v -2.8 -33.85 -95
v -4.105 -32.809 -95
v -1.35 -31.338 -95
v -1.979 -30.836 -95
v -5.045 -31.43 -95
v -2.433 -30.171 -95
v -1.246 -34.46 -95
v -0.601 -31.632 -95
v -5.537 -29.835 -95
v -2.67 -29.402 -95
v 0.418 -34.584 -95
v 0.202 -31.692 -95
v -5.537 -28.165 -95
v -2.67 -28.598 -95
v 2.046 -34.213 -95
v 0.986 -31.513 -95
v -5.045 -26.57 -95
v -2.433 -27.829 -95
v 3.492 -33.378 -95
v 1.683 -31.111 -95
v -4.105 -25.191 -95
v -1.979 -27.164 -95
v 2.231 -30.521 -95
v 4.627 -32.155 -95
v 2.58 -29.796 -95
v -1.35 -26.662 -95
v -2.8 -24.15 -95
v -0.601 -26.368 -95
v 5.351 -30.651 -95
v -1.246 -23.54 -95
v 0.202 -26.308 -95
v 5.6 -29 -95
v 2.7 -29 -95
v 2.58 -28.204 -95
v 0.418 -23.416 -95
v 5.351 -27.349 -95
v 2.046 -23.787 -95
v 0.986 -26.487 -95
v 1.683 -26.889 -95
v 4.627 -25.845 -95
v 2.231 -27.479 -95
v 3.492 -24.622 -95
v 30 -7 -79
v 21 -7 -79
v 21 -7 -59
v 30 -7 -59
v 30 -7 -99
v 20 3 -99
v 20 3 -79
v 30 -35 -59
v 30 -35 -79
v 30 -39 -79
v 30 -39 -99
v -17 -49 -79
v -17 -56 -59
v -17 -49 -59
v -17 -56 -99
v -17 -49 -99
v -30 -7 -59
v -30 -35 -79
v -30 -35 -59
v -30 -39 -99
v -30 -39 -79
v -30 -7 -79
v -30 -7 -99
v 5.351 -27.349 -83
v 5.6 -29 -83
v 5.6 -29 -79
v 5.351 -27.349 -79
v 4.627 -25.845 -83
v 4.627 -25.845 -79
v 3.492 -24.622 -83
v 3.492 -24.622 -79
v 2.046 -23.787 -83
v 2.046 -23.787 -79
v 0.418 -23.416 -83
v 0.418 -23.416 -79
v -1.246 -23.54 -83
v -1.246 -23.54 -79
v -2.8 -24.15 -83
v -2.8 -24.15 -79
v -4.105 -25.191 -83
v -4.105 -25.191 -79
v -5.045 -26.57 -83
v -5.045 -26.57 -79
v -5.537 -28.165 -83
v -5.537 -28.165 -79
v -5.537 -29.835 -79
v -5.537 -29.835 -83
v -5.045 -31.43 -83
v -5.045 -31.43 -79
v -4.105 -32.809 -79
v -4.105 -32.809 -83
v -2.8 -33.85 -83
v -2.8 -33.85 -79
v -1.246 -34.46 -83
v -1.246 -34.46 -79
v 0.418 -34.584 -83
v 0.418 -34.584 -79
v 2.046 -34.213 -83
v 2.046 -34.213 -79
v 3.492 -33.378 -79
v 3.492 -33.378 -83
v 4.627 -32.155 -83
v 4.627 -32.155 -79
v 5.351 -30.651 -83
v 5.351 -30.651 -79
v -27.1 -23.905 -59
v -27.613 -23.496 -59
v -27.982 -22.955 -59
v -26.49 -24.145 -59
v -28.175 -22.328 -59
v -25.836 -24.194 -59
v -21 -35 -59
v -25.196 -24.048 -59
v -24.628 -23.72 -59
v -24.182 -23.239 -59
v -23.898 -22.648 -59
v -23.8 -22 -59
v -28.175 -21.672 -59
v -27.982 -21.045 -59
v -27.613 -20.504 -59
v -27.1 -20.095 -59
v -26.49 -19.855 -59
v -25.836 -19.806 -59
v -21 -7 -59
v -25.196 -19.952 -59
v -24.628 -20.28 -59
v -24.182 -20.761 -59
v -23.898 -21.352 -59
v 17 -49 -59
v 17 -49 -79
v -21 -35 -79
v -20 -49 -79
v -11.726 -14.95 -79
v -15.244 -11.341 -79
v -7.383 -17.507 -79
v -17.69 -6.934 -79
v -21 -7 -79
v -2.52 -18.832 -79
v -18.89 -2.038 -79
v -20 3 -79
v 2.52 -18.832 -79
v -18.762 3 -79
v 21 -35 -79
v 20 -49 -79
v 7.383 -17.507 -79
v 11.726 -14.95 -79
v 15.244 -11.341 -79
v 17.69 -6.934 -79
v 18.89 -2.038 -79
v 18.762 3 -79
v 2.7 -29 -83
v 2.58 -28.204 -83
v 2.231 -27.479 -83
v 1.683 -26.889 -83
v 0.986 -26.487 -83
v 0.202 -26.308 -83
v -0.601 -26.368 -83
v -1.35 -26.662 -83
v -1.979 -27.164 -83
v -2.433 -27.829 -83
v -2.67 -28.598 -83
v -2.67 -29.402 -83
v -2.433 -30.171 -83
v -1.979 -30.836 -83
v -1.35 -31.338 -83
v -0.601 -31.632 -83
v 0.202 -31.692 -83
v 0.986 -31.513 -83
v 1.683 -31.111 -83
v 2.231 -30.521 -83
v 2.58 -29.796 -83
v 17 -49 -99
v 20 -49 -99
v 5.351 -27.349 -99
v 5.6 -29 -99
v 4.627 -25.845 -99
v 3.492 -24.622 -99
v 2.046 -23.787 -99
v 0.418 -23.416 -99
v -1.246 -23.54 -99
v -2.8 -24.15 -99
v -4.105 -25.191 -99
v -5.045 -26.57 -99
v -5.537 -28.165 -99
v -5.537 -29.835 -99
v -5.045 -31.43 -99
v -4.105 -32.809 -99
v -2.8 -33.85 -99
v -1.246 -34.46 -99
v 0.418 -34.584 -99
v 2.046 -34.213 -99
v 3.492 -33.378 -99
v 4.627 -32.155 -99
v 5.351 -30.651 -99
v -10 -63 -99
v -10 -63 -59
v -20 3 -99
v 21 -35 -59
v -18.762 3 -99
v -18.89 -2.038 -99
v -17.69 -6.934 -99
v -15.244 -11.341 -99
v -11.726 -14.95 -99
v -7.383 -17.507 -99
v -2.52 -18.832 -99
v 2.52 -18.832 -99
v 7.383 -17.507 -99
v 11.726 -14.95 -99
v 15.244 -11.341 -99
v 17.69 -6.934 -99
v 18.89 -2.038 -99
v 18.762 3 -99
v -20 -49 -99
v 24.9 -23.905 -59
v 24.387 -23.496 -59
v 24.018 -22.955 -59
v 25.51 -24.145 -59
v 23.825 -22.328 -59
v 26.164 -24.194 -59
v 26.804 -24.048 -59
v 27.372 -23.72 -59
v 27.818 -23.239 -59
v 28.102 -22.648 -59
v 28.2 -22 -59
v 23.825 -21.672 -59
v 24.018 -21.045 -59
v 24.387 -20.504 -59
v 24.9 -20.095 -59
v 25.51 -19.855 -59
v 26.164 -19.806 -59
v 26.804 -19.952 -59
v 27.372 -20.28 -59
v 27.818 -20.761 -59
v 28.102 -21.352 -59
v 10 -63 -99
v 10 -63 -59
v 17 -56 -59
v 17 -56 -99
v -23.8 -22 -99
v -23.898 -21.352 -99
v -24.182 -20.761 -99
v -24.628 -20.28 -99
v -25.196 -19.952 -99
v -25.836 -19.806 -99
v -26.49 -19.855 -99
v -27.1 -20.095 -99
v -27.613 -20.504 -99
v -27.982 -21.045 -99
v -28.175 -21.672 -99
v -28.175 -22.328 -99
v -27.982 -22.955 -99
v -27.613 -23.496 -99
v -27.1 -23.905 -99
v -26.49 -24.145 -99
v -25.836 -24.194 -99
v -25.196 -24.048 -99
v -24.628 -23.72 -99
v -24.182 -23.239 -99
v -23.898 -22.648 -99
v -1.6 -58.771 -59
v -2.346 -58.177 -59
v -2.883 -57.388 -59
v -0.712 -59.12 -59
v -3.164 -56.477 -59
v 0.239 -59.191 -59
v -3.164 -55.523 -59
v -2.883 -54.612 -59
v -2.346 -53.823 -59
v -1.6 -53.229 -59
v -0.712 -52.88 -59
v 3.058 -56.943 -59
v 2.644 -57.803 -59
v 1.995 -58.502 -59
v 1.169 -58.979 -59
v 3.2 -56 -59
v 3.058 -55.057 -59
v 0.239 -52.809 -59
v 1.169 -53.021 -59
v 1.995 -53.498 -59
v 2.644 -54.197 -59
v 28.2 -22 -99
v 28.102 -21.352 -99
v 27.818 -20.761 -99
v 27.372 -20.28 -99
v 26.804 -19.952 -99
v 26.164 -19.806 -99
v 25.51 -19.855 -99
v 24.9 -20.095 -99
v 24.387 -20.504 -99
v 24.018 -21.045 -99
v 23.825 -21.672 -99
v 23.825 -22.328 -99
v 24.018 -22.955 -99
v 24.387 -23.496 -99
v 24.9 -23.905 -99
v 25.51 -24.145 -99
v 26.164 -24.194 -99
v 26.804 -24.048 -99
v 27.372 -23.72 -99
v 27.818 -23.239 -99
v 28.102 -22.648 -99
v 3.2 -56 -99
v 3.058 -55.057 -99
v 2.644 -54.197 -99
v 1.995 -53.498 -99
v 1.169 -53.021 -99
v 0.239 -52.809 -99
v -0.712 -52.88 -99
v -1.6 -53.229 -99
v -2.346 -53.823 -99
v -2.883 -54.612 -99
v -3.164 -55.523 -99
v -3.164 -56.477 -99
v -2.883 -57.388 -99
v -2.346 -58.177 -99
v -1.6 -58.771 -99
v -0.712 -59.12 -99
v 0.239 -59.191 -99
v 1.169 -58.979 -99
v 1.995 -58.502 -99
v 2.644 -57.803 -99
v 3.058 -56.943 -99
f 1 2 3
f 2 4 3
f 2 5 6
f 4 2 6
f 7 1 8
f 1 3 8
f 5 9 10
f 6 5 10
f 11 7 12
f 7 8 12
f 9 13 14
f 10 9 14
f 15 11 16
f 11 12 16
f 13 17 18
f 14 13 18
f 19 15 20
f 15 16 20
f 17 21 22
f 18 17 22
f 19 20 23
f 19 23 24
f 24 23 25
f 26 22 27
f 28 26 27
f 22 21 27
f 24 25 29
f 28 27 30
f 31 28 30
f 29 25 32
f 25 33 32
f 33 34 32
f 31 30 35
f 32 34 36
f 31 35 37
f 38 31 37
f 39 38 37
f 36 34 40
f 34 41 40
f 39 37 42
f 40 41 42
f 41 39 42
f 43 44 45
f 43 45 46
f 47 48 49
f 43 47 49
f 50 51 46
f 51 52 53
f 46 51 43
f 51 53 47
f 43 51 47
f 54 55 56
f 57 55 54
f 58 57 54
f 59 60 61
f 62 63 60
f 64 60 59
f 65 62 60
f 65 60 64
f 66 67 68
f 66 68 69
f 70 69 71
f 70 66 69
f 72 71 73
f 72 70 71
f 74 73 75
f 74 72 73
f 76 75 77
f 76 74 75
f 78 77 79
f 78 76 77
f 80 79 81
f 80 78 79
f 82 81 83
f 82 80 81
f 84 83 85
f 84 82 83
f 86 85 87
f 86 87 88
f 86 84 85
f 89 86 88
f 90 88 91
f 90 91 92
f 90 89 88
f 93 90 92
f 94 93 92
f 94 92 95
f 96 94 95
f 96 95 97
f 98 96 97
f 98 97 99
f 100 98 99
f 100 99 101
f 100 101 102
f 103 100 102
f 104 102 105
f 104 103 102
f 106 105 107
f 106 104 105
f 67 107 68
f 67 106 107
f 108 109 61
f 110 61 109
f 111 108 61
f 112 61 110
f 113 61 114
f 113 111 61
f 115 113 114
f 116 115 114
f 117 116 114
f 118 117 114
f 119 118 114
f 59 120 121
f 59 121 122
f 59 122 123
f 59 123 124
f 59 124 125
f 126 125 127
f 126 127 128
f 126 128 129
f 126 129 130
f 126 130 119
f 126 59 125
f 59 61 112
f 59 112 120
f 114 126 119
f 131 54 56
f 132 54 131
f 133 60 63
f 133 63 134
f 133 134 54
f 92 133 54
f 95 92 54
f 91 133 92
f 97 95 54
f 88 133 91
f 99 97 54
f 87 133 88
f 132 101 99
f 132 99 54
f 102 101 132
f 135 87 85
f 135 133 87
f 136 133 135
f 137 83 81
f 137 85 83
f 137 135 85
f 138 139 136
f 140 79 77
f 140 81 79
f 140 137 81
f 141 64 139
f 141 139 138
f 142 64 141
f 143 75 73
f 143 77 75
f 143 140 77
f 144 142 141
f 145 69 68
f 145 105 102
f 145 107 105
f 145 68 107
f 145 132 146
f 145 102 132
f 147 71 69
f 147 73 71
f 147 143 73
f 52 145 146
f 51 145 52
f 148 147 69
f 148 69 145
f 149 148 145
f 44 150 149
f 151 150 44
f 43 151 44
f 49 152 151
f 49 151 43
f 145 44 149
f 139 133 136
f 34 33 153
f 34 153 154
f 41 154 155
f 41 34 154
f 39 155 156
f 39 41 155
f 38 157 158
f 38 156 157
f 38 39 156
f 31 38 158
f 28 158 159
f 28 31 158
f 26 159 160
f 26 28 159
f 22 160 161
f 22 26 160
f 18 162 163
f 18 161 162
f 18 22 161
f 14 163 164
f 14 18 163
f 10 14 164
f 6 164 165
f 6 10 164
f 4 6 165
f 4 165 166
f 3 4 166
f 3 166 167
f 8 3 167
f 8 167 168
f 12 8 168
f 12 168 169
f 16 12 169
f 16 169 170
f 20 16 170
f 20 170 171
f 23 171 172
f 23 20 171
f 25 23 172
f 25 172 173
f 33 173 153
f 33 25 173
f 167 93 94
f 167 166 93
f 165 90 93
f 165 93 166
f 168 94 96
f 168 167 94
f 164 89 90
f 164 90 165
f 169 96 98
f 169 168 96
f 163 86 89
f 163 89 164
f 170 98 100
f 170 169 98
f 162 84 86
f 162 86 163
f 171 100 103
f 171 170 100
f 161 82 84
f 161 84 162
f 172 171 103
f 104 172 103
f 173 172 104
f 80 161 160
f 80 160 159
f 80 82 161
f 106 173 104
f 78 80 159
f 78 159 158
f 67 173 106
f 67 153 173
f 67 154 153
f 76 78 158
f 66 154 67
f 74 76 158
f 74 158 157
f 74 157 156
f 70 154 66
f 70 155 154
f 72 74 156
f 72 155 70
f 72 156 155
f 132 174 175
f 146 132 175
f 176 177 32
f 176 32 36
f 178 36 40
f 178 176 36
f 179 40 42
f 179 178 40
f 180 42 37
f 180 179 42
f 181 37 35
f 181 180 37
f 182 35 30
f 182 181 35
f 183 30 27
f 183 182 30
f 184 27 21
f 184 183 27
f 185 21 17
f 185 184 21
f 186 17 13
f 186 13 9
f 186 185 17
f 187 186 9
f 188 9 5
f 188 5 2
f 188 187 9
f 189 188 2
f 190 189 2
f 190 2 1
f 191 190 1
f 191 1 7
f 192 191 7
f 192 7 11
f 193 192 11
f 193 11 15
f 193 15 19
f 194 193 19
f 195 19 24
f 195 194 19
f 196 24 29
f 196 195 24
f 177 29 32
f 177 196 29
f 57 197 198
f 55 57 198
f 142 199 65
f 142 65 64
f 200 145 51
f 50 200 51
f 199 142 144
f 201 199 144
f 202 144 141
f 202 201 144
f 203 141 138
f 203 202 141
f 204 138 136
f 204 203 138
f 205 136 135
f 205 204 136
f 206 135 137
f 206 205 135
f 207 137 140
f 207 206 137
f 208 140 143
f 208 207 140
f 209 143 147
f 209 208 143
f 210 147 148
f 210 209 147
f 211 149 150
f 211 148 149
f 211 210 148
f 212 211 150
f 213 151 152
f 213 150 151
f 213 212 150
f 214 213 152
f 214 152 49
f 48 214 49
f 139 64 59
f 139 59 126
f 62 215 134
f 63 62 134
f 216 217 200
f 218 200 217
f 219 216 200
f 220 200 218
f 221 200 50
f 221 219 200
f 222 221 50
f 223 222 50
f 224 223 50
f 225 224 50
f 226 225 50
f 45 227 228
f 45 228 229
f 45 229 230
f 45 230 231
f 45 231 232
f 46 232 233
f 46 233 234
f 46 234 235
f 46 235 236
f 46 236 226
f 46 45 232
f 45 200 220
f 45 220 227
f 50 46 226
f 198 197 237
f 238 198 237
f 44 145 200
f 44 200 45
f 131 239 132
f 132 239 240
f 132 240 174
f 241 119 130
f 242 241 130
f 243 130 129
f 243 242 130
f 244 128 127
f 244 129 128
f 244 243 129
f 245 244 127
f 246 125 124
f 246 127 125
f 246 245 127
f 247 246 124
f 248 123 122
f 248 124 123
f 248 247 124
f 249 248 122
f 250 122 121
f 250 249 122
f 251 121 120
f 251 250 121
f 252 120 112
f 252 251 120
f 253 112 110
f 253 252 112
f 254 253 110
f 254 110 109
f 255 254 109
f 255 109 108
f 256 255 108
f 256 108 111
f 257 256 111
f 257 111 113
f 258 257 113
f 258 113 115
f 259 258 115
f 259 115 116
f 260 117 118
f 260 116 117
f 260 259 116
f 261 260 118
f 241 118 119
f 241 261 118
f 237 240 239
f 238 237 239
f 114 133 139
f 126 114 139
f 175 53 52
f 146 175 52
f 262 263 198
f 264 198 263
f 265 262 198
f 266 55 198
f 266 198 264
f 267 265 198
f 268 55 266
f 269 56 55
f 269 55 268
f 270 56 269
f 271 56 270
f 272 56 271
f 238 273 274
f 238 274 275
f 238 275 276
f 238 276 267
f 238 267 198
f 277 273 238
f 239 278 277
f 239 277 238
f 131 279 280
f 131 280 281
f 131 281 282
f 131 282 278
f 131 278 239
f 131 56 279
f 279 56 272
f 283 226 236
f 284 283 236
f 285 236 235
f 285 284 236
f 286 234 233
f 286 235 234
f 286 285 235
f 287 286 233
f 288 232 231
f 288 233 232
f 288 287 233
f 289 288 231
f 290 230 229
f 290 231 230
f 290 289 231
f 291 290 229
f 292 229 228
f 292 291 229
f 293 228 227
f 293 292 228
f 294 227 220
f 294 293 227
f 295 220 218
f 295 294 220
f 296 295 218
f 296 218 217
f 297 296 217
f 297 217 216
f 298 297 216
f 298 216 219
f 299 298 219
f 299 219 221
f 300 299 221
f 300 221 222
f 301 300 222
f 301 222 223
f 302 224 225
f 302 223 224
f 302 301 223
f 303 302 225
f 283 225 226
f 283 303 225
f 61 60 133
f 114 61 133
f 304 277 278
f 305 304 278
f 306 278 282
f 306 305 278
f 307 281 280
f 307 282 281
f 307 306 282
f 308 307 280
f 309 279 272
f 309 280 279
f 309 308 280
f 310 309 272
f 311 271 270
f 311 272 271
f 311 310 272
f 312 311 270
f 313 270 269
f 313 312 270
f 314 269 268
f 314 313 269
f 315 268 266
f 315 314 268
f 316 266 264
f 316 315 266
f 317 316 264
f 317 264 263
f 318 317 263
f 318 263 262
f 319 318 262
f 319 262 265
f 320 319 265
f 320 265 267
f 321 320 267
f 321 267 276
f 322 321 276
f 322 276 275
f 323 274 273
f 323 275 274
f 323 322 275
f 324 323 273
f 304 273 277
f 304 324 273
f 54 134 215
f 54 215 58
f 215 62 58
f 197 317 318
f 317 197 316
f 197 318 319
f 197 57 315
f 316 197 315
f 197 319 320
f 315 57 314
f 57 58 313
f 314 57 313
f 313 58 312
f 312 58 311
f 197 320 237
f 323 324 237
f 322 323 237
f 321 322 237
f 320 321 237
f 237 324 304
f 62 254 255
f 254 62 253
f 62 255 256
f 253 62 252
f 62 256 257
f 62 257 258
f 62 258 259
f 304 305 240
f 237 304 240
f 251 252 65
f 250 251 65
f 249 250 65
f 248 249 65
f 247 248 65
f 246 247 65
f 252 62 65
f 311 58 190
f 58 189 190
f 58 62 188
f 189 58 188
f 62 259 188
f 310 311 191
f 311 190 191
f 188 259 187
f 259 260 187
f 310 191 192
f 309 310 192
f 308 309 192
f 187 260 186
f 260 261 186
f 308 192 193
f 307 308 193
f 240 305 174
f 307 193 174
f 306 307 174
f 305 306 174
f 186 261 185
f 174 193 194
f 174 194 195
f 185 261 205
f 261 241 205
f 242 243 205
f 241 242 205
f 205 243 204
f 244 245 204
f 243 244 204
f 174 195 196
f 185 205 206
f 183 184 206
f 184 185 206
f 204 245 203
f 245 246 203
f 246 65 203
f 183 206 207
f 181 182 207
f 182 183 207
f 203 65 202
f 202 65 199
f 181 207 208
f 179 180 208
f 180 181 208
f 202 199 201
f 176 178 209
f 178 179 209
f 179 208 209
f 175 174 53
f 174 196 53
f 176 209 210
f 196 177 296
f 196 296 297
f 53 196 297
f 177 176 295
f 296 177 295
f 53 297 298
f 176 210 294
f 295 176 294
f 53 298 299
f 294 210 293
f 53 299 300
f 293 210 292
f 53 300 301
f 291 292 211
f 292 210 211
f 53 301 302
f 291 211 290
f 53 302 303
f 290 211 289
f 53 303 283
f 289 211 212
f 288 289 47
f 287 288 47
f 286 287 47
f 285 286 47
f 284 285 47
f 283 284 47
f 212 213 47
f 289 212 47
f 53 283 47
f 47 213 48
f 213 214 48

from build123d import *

# Parameters (mm, degrees)
CYLINDER014005832_R     = 2.2
CYLINDER014005832_DEPTH = 200
CYLINDER014005833_R     = 2.2
CYLINDER014005833_DEPTH = 200
BOX138_W                = 9
BOX138_H                = 28
BOX138_DEPTH            = 20
BOX136_W                = 9
BOX136_H                = 28
BOX136_DEPTH            = 20
CYLINDER014005829_R     = 5.6
CYLINDER014005829_DEPTH = 4
CYLINDER014005827_R     = 2.7
CYLINDER014005827_DEPTH = 200
CYLINDER014005826_R     = 19
CYLINDER014005826_DEPTH = 20
CYLINDER014005828_R     = 3.2
CYLINDER014005828_DEPTH = 200
CYLINDER014005830_R     = 5.6
CYLINDER014005830_DEPTH = 4
BOX119_W                = 60
BOX119_H                = 52
BOX119_DEPTH            = 20
CHAMFER019_SIZE         = 10
BOX135_W                = 34
BOX135_H                = 14
BOX135_DEPTH            = 40
CHAMFER015_SIZE         = 7


with BuildPart() as v_lec726:
    # Cylinder014005832 → Cylinder014005832 (new body)
    with BuildSketch(Plane(origin=(-26, -22, -140), x_dir=(1, 0, 0), z_dir=(0, 0, 1))):
        Circle(CYLINDER014005832_R)
    extrude(amount=CYLINDER014005832_DEPTH)


with BuildPart() as fusion435:
    # Cylinder014005833 → Cylinder014005833 (new body)
    with BuildSketch(Plane(origin=(26, -22, -140), x_dir=(1, 0, 0), z_dir=(0, 0, 1))):
        Circle(CYLINDER014005833_R)
    extrude(amount=CYLINDER014005833_DEPTH)

    # Fusion435: union Válec726
    add(v_lec726.part)


with BuildPart() as krychle125:
    # Box138 → Box138 (new body)
    with BuildSketch(Plane(origin=(21, -35, -81), x_dir=(1, 0, 0), z_dir=(0, 0, 1))):
        with Locations((4.5, 14)):
            Rectangle(BOX138_W, BOX138_H)
    extrude(amount=BOX138_DEPTH)


with BuildPart() as krychle123:
    # Box136 → Box136 (new body)
    with BuildSketch(Plane(origin=(-30, -35, -81), x_dir=(1, 0, 0), z_dir=(0, 0, 1))):
        with Locations((4.5, 14)):
            Rectangle(BOX136_W, BOX136_H)
    extrude(amount=BOX136_DEPTH)


with BuildPart() as lozisko001:
    # Cylinder014005829 → Cylinder014005829 (new body)
    with BuildSketch(Plane(origin=(0, -29, -97), x_dir=(1, 0, 0), z_dir=(0, 0, 1))):
        Circle(CYLINDER014005829_R)
    extrude(amount=CYLINDER014005829_DEPTH)


with BuildPart() as v_lec723:
    # Cylinder014005827 → Cylinder014005827 (new body)
    with BuildSketch(Plane(origin=(0, -29, -200), x_dir=(1, 0, 0), z_dir=(0, 0, 1))):
        Circle(CYLINDER014005827_R)
    extrude(amount=CYLINDER014005827_DEPTH)


with BuildPart() as v_lec722:
    # Cylinder014005826 → Cylinder014005826 (new body)
    with BuildSketch(Plane.XY.offset(-113)):
        Circle(CYLINDER014005826_R)
    extrude(amount=CYLINDER014005826_DEPTH)


with BuildPart() as v_lec724:
    # Cylinder014005828 → Cylinder014005828 (new body)
    with BuildSketch(Plane(origin=(0, -56, -200), x_dir=(1, 0, 0), z_dir=(0, 0, 1))):
        Circle(CYLINDER014005828_R)
    extrude(amount=CYLINDER014005828_DEPTH)


with BuildPart() as fusion442:
    # Cylinder014005830 → Cylinder014005830 (new body)
    with BuildSketch(Plane(origin=(0, -29, -113), x_dir=(1, 0, 0), z_dir=(0, 0, 1))):
        Circle(CYLINDER014005830_R)
    extrude(amount=CYLINDER014005830_DEPTH)

    # Fusion442: union LOZISKO001, Válec723, Válec722, Válec724
    add(lozisko001.part)
    add(v_lec723.part)
    add(v_lec722.part)
    add(v_lec724.part)


with BuildPart() as chamfer019:
    # Box119 → Box119 (new body)
    with BuildSketch(Plane(origin=(-30, -49, -59), x_dir=(1, 0, 0), z_dir=(0, 0, 1))):
        with Locations((30, 26)):
            Rectangle(BOX119_W, BOX119_H)
    extrude(amount=BOX119_DEPTH)

    # Chamfer019
    chamfer019_edges = [chamfer019.edges().sort_by_distance(p)[0] for p in [
        (-30, -49, -49),
        (-30, 3, -49),
        (30, -49, -49),
        (30, 3, -49),
    ]]
    chamfer(chamfer019_edges, length=CHAMFER019_SIZE)


with BuildPart() as celofin:
    # Box135 → Box135 (new body)
    with BuildSketch(Plane(origin=(-17, -63, -59), x_dir=(1, 0, 0), z_dir=(0, 0, 1))):
        with Locations((17, 7)):
            Rectangle(BOX135_W, BOX135_H)
    extrude(amount=BOX135_DEPTH)

    # Chamfer015
    chamfer015_edges = [celofin.edges().sort_by_distance(p)[0] for p in [
        (-17, -63, -39),
        (17, -63, -39),
    ]]
    chamfer(chamfer015_edges, length=CHAMFER015_SIZE)

    # Fusion438: union Chamfer019
    add(chamfer019.part)


with BuildPart() as celofin_1:
    # Fusion438 placement: moved
    add(celofin.part.moved(Location((0, 0, -54))))

    # Cut061241: cut Fusion442
    add(fusion442.part, mode=Mode.SUBTRACT)


with BuildPart() as celofin_2:
    # Cut061241 placement: moved
    add(celofin_1.part.moved(Location((0, 0, 12))))

    # Fusion434: union Krychle125, Krychle123
    add(krychle125.part)
    add(krychle123.part)

    # Cut061305: cut Fusion435
    add(fusion435.part, mode=Mode.SUBTRACT)


with BuildPart() as celofin_3:
    # Cut061305 placement: moved
    add(celofin_2.part.moved(Location((0, 0, 2))))


solid = celofin_3.part
